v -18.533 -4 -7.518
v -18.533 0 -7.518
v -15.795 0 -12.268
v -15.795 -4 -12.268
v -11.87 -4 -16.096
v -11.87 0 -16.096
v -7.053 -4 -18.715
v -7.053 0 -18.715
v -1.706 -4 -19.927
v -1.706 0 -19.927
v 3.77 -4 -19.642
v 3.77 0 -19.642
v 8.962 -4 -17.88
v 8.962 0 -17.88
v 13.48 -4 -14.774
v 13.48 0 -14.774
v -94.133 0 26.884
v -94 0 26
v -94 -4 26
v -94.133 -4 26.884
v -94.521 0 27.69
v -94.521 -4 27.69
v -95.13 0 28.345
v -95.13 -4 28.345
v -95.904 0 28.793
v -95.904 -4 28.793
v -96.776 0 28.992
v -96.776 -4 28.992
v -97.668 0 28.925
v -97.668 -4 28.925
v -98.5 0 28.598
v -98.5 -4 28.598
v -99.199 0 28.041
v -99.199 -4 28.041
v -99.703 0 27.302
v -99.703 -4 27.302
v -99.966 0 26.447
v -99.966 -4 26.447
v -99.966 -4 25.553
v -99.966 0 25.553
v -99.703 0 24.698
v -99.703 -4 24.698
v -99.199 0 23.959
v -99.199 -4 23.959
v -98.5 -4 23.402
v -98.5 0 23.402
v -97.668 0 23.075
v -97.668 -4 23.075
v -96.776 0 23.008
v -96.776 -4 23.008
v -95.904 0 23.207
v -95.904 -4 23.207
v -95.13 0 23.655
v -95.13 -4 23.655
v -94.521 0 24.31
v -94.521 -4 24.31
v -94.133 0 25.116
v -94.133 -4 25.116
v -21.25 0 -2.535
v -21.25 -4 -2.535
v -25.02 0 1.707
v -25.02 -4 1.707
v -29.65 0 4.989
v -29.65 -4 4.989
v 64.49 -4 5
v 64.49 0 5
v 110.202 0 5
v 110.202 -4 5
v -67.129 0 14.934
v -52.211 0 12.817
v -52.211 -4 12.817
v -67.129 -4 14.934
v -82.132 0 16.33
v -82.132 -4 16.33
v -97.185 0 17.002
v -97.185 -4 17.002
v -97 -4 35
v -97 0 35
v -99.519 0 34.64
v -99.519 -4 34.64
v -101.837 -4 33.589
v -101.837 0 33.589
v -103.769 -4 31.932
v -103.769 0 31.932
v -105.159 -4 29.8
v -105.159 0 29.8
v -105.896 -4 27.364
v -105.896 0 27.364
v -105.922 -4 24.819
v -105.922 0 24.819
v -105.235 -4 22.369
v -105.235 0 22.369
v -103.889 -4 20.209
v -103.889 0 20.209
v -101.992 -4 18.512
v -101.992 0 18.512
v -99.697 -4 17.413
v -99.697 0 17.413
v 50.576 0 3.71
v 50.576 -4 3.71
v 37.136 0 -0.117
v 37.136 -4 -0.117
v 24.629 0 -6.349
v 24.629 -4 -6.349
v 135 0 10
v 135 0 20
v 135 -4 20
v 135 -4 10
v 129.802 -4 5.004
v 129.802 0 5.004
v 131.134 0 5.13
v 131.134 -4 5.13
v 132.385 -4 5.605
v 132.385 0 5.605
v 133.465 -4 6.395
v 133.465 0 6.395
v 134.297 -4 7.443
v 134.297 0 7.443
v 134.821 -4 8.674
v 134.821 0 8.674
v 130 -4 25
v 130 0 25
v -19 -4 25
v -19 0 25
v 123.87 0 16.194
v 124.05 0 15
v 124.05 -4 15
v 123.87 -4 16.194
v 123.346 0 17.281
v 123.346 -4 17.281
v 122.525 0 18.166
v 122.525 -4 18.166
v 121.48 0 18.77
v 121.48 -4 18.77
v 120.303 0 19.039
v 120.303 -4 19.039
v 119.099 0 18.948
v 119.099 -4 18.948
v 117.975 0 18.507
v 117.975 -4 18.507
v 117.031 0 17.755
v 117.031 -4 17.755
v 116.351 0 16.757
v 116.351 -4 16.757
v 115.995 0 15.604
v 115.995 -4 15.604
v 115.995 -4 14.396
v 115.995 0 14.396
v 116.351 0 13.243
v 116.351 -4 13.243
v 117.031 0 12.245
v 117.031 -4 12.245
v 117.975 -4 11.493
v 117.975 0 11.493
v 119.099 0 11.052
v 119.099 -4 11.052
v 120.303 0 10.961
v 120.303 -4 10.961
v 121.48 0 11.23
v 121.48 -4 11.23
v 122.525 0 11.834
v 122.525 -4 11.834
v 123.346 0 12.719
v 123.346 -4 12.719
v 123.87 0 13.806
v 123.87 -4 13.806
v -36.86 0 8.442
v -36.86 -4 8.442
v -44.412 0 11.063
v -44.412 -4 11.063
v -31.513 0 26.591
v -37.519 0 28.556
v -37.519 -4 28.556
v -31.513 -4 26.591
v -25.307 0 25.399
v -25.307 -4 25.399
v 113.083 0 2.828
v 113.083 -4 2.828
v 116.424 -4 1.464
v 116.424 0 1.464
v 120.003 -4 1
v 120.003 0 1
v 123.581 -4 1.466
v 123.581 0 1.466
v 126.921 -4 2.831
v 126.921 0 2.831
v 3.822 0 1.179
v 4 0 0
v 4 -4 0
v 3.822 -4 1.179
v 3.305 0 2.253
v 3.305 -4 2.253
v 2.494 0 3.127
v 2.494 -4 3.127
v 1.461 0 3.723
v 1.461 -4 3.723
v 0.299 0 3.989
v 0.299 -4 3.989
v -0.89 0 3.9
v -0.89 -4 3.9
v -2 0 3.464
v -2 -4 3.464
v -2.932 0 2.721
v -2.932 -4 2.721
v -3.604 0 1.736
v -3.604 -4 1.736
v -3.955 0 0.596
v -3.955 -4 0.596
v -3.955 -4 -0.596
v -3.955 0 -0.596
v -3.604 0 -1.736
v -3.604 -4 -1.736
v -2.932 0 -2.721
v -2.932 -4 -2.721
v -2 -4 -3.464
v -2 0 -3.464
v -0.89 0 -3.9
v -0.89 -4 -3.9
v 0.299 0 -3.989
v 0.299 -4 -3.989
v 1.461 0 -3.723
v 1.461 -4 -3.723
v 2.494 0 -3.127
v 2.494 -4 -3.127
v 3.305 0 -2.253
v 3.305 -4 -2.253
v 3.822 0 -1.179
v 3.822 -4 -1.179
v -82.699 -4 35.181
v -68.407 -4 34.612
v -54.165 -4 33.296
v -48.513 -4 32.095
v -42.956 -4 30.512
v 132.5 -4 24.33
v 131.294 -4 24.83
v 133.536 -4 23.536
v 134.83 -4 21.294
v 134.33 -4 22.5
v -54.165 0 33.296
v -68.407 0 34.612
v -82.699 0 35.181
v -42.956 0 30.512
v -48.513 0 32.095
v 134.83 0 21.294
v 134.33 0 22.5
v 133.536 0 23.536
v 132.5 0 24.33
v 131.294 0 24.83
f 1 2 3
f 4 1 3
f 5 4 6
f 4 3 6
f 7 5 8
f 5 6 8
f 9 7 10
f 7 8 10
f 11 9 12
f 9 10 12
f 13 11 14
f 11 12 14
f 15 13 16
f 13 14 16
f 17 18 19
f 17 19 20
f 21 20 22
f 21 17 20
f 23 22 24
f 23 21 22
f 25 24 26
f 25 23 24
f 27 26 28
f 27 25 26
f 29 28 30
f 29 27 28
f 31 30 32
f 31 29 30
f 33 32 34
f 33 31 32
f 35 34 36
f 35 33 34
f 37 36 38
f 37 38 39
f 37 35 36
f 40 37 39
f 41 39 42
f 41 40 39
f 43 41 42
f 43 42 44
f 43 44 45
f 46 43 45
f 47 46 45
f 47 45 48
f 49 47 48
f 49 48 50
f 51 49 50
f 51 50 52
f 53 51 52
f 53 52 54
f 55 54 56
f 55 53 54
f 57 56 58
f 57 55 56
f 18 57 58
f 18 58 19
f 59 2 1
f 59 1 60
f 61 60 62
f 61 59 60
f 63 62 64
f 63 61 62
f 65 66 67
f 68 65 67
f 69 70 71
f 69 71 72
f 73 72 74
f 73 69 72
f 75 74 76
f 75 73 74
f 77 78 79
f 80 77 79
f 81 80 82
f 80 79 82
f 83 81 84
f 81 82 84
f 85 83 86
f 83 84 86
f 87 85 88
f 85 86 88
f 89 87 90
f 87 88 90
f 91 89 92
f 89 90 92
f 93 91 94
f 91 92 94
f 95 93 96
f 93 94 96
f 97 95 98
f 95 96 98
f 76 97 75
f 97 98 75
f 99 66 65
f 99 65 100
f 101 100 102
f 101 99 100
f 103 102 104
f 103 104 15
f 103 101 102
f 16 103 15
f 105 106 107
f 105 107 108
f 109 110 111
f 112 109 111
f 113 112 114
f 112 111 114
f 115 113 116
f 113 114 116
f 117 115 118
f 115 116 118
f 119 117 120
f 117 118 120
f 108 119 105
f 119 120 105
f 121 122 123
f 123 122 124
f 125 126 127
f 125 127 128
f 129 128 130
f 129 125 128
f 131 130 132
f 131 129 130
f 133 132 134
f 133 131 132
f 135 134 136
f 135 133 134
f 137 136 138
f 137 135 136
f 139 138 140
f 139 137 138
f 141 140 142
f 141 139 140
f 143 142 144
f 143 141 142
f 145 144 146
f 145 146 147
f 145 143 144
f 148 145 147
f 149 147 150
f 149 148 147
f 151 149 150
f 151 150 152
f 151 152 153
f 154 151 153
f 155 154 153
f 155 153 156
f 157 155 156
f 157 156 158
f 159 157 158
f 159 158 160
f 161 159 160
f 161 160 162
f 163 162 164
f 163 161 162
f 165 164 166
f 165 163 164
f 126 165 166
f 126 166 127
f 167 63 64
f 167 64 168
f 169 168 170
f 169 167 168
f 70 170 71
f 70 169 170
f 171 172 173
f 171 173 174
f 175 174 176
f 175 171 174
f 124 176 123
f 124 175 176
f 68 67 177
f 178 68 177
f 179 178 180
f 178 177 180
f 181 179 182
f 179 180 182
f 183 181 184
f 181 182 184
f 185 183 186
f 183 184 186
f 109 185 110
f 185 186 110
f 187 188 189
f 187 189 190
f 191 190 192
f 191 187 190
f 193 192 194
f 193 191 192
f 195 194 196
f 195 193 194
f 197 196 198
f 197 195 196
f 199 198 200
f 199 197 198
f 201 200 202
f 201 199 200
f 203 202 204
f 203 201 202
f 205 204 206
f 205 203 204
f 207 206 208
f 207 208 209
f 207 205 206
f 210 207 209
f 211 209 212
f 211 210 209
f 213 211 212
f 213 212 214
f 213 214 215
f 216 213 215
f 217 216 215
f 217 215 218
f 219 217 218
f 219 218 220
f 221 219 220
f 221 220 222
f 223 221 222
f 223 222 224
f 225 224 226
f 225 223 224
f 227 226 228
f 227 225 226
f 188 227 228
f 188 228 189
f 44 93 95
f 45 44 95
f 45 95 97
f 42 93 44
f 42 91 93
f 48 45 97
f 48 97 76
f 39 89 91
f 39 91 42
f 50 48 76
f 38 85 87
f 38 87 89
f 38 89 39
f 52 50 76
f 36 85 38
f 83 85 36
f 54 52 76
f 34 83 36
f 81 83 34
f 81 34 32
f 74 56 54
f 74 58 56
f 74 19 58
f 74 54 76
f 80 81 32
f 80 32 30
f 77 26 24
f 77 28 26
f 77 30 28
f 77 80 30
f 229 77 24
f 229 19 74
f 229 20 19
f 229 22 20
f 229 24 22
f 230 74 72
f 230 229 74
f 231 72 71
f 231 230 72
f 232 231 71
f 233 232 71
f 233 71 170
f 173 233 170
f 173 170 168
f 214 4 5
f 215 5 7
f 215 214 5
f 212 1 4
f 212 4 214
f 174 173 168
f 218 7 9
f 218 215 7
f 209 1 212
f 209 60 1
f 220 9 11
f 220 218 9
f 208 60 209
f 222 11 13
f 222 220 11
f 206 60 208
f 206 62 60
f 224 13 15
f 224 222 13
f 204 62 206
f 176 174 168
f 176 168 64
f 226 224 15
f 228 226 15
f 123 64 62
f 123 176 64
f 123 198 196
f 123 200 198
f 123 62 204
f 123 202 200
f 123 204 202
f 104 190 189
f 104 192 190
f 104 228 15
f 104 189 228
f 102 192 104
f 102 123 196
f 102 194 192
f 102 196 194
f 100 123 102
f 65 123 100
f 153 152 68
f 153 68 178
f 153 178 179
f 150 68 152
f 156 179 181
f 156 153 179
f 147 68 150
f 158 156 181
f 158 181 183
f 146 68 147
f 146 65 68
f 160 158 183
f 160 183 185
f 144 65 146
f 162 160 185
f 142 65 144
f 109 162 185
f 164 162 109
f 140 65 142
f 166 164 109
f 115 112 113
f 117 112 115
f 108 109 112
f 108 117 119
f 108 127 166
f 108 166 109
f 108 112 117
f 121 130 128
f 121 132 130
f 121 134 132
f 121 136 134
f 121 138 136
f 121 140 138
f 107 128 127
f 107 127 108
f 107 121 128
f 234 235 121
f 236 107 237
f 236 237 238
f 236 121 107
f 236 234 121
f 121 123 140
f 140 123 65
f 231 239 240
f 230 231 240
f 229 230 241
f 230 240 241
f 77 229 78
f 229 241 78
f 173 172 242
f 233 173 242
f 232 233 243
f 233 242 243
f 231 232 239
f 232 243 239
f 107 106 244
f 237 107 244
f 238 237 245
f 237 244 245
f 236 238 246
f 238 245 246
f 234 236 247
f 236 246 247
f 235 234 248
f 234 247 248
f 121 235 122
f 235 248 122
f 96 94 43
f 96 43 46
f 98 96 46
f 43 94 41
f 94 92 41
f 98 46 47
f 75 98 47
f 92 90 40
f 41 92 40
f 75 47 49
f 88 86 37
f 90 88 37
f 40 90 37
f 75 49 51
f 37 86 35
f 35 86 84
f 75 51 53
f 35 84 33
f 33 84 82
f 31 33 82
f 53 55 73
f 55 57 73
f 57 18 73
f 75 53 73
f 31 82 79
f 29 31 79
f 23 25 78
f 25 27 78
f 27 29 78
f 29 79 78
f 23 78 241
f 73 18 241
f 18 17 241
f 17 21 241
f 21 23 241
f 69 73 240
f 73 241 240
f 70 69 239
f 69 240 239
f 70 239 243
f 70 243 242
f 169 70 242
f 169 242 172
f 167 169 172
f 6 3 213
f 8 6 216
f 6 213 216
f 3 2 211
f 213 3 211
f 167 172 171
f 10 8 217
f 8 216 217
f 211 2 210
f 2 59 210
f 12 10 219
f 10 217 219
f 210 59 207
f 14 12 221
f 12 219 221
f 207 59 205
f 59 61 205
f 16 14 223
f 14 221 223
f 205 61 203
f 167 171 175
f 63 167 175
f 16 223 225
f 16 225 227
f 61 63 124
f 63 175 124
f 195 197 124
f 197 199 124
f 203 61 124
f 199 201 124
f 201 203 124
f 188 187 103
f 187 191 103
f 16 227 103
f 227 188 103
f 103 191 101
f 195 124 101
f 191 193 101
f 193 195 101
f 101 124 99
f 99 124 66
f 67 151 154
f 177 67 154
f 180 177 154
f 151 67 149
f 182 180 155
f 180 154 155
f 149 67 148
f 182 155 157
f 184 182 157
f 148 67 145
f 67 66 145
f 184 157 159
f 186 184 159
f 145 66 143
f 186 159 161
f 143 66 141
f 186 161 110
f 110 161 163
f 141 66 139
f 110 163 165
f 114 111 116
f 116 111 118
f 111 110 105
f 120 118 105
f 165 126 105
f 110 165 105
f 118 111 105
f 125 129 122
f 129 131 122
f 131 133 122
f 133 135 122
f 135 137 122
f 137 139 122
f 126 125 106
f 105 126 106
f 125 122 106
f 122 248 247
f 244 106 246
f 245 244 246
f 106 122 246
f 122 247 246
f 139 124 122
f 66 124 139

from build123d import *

# Parameters (mm, degrees)
SKETCH_R   = 4
SKETCH_R_2 = 3
SKETCH_R_3 = 4.05
PAD_DEPTH  = 4


with BuildPart() as part:
    # Sketch → Pad (new body)
    with BuildSketch(Plane.XZ):
        with BuildLine():
            ThreePointArc((-18.533333, -7.517683), (-4.421216, -19.505201), (13.480464, -14.774204))
            ThreePointArc((64.49, 5), (37.135878, -0.116509), (13.480464, -14.774204))
            Line((64.49, 5), (110.202041, 5))
            ThreePointArc((110.202041, 5), (120.002802, 1), (129.801962, 5.003923))
            ThreePointArc((129.801962, 5.003923), (133.464809, 6.395129), (135, 10))
            Line((135, 20), (135, 10))
            ThreePointArc((135, 20), (133.535534, 23.535534), (130, 25))
            Line((130, 25), (-19, 25))
            ThreePointArc((-37.518519, 28.555792), (-28.428404, 25.896994), (-19, 25))
            ThreePointArc((-37.518519, 28.555792), (-45.721006, 31.350796), (-54.165443, 33.296133))
            ThreePointArc((-54.165443, 33.296133), (-75.549225, 34.99014), (-97, 35))
            ThreePointArc((-97, 35), (-105.999524, 26.09252), (-97.185031, 17.001902))
            ThreePointArc((-52.210866, 12.81731), (-74.622366, 15.721932), (-97.185031, 17.001902))
            ThreePointArc((-29.649803, 4.989386), (-40.598863, 9.858688), (-52.210866, 12.81731))
            ThreePointArc((-18.533333, -7.517683), (-23.014081, -0.306462), (-29.649803, 4.989386))
        make_face()
        Circle(SKETCH_R, mode=Mode.SUBTRACT)
        with Locations((-97, 26)):
            Circle(SKETCH_R_2, mode=Mode.SUBTRACT)
        with Locations((120, 15)):
            Circle(SKETCH_R_3, mode=Mode.SUBTRACT)
    extrude(amount=PAD_DEPTH)


solid = part.part
